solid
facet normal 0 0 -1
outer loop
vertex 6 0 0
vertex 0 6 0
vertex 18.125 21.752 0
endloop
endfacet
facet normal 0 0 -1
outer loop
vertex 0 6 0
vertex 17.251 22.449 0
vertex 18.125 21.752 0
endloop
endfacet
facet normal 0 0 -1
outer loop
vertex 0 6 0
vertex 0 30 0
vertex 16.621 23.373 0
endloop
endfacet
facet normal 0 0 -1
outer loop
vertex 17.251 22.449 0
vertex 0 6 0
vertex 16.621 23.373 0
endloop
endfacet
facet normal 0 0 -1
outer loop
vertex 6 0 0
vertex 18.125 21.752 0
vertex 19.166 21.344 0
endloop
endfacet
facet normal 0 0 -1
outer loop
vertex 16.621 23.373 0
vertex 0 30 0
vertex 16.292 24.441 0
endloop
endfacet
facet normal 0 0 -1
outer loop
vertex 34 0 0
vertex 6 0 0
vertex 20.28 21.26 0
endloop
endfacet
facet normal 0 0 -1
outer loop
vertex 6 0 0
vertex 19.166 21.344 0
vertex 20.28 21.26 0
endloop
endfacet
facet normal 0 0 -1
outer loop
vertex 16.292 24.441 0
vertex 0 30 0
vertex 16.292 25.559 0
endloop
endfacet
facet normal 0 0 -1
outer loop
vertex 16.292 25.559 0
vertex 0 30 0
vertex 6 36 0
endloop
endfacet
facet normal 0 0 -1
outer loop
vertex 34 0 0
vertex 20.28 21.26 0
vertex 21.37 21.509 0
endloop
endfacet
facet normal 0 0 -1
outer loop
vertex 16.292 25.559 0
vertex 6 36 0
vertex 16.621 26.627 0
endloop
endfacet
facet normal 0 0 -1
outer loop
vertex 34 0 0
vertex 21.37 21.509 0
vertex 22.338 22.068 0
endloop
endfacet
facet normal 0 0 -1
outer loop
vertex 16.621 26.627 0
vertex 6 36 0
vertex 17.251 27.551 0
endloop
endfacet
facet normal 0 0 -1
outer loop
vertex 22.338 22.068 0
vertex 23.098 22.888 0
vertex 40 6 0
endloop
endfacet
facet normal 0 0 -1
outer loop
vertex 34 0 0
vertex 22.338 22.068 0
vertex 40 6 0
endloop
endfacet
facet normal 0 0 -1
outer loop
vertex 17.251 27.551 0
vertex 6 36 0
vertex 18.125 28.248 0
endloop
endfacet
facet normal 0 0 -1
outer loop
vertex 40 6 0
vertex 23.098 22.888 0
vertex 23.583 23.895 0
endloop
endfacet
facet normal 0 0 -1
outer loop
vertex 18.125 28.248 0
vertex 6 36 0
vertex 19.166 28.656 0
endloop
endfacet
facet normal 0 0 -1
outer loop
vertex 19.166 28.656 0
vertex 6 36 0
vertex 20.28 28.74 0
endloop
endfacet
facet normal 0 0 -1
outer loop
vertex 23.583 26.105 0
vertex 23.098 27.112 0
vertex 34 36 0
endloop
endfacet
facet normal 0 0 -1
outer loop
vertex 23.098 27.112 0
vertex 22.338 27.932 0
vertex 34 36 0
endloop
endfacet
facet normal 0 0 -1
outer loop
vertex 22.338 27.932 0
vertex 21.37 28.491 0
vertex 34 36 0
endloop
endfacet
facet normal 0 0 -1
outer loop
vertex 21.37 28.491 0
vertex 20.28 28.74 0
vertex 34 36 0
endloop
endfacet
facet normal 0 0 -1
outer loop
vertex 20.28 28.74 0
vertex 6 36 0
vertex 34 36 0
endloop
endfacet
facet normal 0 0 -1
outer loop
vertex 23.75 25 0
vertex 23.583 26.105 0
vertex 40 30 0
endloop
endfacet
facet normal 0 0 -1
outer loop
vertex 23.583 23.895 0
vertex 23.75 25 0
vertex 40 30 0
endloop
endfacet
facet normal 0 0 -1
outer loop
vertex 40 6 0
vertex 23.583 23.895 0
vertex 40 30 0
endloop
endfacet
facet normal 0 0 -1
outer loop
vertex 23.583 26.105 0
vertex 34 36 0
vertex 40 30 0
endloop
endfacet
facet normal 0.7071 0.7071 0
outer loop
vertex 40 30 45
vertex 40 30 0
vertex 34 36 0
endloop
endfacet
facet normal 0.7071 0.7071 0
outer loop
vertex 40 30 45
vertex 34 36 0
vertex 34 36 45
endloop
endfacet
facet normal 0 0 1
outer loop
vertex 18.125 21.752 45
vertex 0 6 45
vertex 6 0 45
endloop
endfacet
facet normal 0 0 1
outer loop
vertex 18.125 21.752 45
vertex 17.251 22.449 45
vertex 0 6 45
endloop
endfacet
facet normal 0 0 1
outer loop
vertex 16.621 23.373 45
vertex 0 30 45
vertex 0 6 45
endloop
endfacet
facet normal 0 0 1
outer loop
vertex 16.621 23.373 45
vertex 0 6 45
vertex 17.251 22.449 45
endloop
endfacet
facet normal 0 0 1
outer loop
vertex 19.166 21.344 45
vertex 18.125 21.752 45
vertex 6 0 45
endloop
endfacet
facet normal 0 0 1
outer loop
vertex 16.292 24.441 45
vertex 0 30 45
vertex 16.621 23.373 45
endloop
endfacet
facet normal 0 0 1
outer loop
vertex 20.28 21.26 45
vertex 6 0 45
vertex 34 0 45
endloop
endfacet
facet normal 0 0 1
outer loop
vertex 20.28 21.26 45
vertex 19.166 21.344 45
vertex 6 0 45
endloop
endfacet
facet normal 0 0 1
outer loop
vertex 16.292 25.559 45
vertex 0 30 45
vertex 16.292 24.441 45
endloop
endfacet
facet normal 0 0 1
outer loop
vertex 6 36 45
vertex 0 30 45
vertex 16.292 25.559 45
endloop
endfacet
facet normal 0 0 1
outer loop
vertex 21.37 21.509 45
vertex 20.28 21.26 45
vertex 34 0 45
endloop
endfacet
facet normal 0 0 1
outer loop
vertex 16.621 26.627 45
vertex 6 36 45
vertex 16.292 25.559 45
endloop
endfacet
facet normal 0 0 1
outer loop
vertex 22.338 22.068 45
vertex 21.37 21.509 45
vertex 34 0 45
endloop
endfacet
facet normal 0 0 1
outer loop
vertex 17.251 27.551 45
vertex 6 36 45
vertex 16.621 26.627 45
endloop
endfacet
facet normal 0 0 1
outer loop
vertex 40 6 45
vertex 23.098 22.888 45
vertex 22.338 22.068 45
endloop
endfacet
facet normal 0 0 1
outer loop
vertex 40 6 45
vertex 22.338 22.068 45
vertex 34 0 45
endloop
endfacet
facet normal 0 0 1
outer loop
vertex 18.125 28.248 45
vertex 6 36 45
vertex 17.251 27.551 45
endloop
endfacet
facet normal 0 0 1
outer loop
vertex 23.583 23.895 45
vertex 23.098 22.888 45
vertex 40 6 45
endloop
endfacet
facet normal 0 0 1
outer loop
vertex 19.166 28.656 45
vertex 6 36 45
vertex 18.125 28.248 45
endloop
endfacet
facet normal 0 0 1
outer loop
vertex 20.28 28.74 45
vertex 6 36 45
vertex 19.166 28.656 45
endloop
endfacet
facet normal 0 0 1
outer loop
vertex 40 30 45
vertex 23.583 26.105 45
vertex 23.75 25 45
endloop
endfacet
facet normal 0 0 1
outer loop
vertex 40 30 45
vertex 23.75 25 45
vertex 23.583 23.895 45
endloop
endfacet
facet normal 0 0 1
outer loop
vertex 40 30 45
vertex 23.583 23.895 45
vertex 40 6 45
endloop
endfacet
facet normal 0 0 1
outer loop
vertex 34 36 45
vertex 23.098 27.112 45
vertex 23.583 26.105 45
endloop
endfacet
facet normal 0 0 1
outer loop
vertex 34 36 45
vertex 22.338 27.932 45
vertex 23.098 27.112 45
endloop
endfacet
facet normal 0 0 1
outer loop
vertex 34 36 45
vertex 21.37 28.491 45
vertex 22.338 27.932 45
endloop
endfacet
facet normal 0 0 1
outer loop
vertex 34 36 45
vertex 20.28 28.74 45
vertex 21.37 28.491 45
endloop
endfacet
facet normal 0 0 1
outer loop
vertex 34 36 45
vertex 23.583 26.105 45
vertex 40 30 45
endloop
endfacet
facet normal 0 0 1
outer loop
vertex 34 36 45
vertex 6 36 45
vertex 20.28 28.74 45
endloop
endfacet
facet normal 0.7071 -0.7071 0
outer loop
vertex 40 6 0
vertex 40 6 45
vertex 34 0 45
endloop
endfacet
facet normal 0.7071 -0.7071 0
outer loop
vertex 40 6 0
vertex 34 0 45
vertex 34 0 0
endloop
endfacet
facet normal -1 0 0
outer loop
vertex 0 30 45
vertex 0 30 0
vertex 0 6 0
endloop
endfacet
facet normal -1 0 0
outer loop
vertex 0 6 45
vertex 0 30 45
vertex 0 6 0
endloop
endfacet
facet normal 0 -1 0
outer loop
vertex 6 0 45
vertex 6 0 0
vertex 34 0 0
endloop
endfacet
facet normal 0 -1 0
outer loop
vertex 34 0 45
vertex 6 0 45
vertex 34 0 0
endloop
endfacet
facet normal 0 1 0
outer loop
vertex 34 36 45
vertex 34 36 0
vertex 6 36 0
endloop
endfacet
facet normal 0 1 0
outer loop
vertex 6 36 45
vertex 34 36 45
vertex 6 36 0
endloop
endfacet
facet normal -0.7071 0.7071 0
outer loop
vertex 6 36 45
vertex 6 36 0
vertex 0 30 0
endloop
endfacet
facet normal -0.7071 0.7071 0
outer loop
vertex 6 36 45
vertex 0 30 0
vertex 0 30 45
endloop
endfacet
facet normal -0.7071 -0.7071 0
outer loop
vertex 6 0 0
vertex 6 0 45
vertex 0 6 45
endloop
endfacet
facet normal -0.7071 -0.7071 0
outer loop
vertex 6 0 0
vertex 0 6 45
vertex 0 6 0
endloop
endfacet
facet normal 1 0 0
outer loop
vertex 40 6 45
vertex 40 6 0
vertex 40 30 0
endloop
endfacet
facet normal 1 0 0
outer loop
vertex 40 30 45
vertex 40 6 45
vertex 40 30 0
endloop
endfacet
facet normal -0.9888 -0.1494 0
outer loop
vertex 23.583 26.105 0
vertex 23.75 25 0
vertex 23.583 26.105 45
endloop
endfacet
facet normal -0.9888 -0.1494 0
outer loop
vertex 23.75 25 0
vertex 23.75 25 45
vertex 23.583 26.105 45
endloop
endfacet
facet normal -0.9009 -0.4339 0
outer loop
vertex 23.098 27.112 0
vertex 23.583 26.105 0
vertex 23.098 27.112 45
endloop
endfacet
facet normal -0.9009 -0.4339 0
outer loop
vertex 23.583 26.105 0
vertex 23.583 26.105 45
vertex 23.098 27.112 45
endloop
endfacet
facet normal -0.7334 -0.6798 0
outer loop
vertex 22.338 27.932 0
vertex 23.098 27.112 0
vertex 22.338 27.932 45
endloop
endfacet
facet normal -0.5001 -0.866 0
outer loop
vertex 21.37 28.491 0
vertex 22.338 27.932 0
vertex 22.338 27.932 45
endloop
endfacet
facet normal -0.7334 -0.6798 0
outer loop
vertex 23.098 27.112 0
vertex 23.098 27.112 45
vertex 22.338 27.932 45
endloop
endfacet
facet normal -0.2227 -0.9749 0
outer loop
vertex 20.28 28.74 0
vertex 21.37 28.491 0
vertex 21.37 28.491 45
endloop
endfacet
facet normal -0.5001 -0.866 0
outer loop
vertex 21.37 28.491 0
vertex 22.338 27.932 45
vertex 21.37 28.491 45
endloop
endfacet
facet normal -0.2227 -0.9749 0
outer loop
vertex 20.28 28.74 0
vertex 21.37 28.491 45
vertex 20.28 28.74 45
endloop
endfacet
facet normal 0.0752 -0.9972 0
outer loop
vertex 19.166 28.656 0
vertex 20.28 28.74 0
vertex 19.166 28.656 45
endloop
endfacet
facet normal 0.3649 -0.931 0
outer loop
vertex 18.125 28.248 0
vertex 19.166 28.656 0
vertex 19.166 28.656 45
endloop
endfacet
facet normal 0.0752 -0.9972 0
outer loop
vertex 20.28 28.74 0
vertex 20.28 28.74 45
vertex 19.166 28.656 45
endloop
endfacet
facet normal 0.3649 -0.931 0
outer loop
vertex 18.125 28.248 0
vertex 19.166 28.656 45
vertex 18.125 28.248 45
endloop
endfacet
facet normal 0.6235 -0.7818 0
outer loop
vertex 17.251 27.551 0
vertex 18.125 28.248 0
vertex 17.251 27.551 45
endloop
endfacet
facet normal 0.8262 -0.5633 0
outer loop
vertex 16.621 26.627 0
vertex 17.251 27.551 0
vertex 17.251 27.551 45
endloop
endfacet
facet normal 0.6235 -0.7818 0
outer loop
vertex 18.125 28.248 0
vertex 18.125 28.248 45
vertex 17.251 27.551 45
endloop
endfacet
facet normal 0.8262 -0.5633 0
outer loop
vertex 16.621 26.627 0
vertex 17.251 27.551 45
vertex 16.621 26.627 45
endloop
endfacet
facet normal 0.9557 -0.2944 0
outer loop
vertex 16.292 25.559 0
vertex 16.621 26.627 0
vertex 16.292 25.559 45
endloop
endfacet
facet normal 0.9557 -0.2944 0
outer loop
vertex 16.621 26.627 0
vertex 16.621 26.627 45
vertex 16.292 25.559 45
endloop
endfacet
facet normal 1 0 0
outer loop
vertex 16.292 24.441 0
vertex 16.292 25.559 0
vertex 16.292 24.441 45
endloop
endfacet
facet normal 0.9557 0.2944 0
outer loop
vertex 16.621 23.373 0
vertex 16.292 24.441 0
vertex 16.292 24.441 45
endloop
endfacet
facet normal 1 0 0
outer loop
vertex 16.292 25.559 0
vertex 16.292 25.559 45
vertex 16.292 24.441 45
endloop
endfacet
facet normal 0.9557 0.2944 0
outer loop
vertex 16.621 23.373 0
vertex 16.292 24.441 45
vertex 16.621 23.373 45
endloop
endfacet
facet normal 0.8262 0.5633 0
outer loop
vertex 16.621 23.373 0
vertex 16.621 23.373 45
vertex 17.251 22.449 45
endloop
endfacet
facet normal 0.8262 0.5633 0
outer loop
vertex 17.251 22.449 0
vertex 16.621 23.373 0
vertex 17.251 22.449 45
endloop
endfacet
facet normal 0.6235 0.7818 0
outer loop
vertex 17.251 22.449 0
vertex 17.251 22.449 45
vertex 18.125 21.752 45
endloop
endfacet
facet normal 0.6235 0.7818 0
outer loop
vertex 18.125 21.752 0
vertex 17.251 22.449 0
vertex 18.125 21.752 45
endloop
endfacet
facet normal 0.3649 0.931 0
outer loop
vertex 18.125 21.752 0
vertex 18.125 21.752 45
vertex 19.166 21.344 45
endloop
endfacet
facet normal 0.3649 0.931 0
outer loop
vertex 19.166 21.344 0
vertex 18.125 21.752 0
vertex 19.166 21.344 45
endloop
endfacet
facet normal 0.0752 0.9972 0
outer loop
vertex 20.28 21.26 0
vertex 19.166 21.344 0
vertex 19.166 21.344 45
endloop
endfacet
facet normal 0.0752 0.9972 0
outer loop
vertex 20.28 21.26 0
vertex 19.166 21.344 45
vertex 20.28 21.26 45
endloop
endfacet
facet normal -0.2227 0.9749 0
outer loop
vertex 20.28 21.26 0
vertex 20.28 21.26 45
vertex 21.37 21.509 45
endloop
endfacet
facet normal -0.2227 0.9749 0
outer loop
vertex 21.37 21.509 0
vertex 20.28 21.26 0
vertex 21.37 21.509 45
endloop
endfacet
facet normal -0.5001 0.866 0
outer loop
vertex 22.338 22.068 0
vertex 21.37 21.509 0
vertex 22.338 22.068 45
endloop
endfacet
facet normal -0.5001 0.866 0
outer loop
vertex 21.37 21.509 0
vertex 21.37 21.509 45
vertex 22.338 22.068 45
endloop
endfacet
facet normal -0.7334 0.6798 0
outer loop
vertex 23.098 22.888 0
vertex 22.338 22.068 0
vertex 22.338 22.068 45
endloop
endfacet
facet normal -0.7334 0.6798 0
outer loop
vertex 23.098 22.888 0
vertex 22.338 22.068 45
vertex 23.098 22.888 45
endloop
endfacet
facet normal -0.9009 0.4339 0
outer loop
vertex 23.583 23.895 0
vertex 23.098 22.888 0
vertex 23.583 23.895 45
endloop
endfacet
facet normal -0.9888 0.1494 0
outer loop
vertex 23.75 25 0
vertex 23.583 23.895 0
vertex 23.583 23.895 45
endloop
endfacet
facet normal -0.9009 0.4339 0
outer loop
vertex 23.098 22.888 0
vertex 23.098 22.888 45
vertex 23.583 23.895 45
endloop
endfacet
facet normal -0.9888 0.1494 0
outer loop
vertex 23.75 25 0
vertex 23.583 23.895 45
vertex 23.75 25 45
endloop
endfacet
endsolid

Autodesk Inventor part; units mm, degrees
ref_plane "YZ Plane" through (0, 0, 0) normal (1, 0, 0) x (0, 1, 0)
ref_plane "XZ Plane" through (0, 0, 0) normal (0, 1, 0) x (-1, 0, 0)
ref_plane "XY Plane" through (0, 0, 0) normal (0, 0, 1) x (1, 0, 0)
sketch "Sketch1" plane through (0, 0, 0) normal (0, 0, 1) x (1, 0, 0)
  line L0 (0, 0) -> (40, 0)
  line L1 (40, 0) -> (40, 36)
  line L2 (40, 36) -> (0, 36)
  line L3 (0, 36) -> (0, 0)
  dimension "d0" = 40
  dimension "d1" = 36
extrude "Extrusion1" add sketch "Sketch1" along normal blind 45
sketch "Sketch2" plane through (0, 0, 45) normal (0, 0, 1) x (1, 0, 0)
  circle A0 centre (20, 25) radius 3.75
  line L0 (0, 0) -> (40, 0) projected
  dimension "d4" = 7.5
  dimension "d7" = 25
extrude "Extrusion2" cut sketch "Sketch2" against normal through all
chamfer "Chamfer1" distance 6 angle 45 4 edges at (40, 36, 22.5) (40, 0, 22.5) (0, 36, 22.5) (0, 0, 22.5)
properties part number "5cm block"
